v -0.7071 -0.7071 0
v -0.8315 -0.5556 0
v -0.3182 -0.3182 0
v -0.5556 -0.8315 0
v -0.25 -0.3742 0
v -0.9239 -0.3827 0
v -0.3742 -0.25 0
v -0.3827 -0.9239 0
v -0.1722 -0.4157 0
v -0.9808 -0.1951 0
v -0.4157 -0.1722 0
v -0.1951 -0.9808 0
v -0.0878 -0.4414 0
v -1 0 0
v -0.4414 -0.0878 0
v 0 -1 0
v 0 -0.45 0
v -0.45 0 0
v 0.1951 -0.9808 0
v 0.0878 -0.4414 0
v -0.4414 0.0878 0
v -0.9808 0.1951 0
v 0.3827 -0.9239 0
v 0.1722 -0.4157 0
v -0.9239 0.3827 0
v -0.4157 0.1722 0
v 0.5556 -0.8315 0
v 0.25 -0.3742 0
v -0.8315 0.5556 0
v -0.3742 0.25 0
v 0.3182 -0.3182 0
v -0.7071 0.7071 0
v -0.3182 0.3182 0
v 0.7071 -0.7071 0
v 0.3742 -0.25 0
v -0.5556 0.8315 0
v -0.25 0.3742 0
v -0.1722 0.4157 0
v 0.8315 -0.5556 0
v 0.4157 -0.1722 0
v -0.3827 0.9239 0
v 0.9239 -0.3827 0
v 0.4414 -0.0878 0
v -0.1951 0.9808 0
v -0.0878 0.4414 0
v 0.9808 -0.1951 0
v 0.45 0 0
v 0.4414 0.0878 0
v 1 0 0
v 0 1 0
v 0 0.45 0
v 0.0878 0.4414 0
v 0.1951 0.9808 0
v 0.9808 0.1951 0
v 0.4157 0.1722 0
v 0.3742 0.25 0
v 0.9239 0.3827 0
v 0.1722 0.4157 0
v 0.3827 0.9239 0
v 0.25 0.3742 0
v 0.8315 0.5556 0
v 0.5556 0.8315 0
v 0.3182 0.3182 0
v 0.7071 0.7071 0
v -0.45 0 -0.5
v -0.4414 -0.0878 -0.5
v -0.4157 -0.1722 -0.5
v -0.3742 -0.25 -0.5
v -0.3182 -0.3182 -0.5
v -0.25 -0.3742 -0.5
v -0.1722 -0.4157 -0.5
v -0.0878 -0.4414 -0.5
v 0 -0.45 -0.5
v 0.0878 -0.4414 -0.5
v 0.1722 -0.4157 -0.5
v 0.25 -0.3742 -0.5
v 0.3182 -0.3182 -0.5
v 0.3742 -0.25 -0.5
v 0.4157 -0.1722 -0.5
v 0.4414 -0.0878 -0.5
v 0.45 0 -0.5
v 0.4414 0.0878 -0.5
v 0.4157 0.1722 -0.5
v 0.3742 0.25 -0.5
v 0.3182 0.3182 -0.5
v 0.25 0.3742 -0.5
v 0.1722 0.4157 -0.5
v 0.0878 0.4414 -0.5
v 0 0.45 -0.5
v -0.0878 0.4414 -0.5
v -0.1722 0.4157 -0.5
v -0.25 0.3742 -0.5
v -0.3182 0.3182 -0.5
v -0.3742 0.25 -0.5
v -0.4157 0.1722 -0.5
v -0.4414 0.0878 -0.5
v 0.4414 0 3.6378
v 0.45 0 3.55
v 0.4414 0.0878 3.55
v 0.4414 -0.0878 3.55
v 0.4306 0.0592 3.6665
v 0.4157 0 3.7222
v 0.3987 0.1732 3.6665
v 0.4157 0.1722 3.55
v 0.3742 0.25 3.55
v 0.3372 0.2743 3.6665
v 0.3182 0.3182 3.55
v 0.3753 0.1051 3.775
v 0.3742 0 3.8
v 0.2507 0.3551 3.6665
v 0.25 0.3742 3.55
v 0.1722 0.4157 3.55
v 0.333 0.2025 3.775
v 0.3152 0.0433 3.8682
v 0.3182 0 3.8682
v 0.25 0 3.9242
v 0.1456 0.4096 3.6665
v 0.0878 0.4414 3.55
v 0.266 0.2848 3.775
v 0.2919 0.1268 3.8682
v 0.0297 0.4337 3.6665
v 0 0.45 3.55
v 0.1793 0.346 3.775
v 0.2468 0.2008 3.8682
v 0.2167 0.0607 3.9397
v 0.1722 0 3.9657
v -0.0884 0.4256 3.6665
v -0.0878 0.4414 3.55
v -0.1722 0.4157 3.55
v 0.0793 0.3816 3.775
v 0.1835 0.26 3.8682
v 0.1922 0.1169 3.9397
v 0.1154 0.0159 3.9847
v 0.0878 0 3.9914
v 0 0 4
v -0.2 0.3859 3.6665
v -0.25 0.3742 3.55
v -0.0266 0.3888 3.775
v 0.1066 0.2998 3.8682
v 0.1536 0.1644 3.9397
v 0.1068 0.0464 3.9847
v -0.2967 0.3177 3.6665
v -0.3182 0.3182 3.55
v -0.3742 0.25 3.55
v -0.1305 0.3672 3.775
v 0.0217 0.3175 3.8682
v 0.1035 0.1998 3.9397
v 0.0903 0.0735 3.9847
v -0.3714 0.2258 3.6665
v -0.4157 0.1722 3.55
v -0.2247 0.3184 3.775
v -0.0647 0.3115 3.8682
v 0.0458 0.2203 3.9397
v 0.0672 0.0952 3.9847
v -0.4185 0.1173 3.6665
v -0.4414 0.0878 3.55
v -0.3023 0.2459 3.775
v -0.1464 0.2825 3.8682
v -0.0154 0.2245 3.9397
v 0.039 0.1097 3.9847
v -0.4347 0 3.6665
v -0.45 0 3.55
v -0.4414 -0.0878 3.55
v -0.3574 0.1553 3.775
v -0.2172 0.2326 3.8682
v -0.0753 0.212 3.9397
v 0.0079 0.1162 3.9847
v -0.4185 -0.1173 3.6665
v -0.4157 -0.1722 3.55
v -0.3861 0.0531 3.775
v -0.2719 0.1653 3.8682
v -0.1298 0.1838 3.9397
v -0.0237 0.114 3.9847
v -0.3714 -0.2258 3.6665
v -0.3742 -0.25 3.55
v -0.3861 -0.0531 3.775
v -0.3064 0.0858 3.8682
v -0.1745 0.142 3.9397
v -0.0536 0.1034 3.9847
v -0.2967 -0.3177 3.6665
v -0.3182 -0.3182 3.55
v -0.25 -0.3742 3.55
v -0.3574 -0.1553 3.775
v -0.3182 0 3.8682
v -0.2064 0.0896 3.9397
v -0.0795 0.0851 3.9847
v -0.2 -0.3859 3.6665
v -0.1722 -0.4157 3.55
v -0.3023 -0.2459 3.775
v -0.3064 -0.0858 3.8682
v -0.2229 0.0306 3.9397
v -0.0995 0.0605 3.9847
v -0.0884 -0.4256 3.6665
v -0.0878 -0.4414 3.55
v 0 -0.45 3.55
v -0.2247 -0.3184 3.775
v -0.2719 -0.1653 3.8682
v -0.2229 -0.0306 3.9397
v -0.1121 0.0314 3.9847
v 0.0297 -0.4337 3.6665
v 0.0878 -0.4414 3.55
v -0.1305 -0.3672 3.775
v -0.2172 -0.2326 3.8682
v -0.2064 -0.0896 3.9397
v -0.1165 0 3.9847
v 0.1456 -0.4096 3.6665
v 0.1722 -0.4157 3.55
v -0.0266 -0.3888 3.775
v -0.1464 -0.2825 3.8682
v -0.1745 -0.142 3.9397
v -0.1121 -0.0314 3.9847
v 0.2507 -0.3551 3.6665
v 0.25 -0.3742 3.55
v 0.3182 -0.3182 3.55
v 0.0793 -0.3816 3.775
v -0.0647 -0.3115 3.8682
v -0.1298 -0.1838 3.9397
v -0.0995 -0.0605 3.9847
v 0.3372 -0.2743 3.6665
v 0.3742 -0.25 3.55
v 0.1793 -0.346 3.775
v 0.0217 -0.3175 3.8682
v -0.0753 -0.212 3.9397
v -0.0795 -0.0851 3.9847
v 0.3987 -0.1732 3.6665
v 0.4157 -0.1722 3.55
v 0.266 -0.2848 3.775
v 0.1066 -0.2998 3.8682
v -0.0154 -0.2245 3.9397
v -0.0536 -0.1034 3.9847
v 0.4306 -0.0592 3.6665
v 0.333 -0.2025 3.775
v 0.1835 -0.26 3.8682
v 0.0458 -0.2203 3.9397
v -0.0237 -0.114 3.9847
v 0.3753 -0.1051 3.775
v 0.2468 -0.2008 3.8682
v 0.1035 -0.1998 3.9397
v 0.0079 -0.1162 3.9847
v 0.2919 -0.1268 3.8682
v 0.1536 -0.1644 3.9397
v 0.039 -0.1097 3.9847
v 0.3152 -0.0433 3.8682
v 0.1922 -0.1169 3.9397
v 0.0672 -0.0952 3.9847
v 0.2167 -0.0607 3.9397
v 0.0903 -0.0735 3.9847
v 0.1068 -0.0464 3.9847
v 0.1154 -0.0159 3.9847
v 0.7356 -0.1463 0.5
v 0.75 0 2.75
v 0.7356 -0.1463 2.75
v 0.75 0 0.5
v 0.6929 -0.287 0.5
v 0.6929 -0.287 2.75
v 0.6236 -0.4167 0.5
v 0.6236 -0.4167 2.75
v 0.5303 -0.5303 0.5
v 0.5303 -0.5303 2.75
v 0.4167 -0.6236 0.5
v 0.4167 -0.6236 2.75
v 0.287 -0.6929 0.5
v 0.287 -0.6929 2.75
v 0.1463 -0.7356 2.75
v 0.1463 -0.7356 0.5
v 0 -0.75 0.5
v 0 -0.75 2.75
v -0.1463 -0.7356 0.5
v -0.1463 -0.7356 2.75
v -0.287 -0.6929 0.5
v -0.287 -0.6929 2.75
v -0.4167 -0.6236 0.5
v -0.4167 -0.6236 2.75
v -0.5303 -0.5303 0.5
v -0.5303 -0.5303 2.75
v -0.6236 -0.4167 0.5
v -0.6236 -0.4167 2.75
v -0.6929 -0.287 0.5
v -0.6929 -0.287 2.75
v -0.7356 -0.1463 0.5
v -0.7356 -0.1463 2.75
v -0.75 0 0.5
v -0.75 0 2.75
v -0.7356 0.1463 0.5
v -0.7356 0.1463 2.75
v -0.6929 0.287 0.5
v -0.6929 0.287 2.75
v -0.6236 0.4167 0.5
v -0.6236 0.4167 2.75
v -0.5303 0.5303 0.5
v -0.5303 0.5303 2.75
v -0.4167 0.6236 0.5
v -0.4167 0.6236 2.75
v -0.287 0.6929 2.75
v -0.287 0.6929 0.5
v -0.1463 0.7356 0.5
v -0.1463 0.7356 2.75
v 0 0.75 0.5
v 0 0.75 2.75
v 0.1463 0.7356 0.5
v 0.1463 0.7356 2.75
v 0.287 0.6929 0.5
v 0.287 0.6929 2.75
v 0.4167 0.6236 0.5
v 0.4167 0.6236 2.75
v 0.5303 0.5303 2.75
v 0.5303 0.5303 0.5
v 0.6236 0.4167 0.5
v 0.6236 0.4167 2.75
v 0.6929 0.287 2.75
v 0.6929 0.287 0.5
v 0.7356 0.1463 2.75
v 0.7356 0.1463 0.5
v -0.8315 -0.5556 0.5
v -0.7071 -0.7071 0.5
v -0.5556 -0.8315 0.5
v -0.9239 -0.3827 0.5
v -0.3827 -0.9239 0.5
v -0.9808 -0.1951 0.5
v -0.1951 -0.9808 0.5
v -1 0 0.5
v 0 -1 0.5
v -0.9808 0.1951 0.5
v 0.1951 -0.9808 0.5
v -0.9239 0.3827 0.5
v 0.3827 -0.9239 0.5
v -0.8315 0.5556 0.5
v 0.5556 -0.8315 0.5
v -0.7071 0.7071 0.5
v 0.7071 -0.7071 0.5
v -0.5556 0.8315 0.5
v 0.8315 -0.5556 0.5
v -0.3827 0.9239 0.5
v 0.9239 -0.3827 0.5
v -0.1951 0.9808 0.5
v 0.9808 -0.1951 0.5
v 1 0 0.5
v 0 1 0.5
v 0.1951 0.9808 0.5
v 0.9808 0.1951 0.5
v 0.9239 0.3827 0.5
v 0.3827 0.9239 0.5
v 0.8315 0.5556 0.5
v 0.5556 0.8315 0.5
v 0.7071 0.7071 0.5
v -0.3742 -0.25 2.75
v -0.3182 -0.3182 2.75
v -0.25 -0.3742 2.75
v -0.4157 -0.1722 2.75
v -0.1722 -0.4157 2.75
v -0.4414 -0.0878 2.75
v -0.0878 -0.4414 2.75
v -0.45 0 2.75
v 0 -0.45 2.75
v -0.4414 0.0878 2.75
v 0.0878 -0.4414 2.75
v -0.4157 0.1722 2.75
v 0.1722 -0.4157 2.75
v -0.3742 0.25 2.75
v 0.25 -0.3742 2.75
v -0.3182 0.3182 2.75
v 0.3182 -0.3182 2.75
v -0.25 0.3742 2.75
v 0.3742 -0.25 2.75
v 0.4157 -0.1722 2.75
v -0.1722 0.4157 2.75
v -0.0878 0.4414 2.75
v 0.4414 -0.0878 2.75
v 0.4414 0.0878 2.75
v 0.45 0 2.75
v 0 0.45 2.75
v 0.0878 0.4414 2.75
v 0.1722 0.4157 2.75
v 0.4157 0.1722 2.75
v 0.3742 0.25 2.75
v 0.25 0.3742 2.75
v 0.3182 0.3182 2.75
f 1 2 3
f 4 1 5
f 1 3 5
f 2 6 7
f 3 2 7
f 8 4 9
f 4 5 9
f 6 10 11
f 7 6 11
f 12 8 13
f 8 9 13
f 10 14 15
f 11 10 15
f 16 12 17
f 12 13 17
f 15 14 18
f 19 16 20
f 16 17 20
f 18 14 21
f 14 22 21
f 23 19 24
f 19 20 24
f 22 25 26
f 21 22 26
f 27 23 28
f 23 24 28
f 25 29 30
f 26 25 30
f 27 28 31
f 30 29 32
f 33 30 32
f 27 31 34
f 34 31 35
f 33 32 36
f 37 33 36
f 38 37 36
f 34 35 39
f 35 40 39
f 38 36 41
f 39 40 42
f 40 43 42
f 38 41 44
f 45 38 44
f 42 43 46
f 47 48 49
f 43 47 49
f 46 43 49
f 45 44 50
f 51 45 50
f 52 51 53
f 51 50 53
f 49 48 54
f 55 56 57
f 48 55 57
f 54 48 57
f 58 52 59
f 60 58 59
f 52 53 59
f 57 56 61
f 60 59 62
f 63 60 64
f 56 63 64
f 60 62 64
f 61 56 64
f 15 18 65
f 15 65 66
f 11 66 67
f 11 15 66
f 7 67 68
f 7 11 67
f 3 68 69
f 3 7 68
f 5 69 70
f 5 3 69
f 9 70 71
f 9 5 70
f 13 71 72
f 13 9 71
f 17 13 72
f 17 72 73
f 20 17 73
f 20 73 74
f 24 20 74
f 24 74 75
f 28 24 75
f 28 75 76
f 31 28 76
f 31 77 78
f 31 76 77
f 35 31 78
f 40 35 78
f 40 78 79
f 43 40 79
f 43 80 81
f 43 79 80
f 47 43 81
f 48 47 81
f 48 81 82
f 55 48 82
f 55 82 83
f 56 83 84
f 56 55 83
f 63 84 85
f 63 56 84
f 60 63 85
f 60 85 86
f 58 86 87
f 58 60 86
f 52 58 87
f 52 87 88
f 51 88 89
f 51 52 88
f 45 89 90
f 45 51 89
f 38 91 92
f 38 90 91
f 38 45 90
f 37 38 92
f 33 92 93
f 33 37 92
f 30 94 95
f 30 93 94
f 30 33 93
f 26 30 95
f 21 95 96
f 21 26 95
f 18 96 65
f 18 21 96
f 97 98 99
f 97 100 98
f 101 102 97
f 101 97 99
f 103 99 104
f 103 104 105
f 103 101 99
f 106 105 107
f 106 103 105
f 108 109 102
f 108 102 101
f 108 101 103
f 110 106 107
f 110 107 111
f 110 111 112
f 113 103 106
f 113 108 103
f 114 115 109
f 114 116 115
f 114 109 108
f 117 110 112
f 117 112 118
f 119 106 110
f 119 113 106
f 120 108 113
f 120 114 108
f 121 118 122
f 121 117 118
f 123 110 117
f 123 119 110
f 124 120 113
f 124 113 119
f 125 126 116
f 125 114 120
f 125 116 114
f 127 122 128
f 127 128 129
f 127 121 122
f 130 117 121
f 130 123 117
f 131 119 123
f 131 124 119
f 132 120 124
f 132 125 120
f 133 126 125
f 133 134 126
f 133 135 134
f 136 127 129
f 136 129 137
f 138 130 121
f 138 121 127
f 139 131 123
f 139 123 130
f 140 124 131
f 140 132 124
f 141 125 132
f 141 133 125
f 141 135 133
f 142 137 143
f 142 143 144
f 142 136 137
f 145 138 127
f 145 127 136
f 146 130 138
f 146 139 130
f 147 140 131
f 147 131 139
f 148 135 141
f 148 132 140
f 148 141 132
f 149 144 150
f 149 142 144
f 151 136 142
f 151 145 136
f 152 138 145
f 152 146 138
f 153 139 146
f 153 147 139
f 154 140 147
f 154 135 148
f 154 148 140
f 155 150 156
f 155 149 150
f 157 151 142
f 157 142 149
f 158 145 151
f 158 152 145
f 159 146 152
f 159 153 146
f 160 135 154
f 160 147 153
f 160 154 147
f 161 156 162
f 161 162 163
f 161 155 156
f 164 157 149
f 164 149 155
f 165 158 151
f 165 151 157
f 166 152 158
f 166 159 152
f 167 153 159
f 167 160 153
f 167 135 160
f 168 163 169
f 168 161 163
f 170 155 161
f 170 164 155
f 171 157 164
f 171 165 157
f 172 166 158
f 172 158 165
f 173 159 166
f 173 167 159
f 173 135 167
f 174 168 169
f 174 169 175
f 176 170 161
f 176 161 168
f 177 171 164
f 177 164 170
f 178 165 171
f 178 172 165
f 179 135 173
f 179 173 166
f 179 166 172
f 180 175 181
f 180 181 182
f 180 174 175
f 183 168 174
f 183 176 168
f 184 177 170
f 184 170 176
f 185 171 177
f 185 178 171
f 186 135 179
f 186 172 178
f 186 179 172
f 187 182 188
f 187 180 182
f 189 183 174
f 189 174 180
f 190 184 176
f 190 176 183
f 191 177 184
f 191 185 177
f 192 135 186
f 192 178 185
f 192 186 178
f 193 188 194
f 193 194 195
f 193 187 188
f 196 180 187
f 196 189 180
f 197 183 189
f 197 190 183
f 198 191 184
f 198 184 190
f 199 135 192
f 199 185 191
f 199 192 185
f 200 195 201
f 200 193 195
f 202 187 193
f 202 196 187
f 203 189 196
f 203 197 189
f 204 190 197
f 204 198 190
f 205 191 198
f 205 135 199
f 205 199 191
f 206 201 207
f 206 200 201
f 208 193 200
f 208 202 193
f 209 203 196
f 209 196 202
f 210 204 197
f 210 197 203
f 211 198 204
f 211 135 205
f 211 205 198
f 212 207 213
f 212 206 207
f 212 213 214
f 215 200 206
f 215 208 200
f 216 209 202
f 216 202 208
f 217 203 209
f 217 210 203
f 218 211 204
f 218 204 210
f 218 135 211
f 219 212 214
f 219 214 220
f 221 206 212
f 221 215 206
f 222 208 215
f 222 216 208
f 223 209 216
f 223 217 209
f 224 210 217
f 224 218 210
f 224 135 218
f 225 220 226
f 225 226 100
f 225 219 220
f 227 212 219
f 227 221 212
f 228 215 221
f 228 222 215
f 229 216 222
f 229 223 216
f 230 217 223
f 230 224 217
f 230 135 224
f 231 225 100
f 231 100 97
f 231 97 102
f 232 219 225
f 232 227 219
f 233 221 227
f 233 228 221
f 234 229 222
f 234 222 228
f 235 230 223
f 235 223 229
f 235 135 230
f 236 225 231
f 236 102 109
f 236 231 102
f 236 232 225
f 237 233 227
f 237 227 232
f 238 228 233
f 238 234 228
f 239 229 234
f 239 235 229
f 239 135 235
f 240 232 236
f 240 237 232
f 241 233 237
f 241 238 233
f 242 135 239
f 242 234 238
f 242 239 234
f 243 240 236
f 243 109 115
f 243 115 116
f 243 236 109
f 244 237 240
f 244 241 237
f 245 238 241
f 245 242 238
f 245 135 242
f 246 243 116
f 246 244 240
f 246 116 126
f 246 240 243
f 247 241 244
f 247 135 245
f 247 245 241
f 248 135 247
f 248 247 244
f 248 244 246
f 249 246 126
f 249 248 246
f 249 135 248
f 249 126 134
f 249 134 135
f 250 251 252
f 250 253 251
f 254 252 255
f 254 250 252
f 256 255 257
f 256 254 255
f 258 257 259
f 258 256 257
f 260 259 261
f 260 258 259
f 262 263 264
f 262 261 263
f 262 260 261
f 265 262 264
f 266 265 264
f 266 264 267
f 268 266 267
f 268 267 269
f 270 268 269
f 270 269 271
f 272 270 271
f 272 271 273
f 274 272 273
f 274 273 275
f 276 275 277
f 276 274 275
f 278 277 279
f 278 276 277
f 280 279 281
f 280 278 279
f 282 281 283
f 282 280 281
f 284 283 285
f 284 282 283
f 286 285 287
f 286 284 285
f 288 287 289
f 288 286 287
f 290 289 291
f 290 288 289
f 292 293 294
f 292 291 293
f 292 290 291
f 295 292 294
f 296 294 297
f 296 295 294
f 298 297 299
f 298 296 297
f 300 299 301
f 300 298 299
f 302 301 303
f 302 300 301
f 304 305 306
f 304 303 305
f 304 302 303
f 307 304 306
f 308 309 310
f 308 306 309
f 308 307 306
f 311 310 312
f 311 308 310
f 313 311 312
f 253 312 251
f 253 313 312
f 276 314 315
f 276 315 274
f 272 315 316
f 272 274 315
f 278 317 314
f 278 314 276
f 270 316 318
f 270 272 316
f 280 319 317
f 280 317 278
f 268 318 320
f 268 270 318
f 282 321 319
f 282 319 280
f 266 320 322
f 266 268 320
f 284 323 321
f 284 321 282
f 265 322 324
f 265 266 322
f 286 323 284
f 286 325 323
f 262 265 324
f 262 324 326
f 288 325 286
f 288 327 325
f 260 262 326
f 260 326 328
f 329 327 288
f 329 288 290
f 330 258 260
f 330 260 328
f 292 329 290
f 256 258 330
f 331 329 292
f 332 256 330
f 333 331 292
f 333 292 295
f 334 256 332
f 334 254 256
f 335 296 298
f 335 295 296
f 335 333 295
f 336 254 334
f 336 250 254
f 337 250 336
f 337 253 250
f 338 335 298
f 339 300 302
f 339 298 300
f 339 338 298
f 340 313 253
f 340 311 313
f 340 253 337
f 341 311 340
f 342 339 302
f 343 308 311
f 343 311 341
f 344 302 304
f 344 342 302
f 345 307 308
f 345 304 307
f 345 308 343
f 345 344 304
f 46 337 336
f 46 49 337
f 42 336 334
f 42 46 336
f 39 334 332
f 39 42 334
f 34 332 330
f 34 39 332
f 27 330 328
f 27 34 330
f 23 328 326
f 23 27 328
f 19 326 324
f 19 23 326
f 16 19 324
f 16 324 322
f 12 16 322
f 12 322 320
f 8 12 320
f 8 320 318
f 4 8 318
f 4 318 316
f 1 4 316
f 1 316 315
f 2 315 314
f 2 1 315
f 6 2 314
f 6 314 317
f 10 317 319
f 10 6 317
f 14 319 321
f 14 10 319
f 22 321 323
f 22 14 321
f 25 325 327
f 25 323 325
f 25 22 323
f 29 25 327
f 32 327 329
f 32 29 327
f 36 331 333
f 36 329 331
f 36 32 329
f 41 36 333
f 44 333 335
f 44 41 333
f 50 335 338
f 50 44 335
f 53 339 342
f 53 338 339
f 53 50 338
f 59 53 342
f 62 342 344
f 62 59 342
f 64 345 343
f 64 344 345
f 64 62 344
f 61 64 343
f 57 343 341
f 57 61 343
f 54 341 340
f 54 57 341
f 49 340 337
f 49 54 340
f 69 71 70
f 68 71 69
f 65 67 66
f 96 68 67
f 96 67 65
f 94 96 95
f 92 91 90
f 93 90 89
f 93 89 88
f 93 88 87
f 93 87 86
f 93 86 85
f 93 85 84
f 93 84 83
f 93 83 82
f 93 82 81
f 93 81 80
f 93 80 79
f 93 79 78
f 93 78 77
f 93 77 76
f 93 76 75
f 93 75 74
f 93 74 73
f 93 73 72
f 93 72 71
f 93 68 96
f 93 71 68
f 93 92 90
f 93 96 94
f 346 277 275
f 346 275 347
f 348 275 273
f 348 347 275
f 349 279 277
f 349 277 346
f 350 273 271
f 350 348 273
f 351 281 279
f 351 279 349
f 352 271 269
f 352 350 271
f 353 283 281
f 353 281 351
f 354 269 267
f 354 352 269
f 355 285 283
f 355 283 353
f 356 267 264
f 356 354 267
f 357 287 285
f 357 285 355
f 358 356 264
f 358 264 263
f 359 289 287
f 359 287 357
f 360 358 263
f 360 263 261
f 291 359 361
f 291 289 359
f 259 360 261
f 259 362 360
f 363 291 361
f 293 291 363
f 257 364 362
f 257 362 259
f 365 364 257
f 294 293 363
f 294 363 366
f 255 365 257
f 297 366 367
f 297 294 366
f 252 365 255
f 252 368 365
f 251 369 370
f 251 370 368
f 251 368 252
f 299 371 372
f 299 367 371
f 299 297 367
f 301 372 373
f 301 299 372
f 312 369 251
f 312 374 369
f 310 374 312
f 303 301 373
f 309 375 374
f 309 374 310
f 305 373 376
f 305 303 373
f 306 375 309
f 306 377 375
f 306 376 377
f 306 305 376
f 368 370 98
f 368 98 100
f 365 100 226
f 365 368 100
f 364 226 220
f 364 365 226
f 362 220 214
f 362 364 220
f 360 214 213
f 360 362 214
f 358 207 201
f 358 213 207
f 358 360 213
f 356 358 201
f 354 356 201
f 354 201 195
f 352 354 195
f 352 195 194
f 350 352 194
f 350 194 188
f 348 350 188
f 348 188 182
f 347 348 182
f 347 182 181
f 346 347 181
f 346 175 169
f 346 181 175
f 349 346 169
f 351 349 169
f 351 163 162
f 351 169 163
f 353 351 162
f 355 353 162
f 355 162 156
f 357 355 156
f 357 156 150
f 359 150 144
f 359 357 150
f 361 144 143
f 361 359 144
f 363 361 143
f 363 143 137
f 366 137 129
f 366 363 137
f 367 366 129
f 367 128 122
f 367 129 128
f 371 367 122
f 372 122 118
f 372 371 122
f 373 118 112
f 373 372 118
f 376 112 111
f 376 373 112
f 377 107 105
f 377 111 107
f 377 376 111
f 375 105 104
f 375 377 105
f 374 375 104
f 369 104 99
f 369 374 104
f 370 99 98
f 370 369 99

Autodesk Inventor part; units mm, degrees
ref_plane "YZ Plane" through (0, 0, 0) normal (1, 0, 0) x (0, 1, 0)
ref_plane "XZ Plane" through (0, 0, 0) normal (0, 1, 0) x (-1, 0, 0)
ref_plane "XY Plane" through (0, 0, 0) normal (0, 0, 1) x (1, 0, 0)
sketch "Skizze1" plane through (0, 0, 0) normal (0, 0, 1) x (1, 0, 0)
  circle A0 centre (0, 0) radius 1
  dimension "d0" = 2
extrude "Extrusion1" add sketch "Skizze1" along normal blind 0.5
sketch "Skizze2" plane through (0, 0, 0.5) normal (0, 0, 1) x (1, 0, 0)
  circle A0 centre (0, 0) radius 0.75
  dimension "d3" = 1.5
extrude "Extrusion2" add sketch "Skizze2" along normal blind 2.25
sketch "Skizze3" plane through (0, 0, 2.75) normal (0, 0, 1) x (1, 0, 0)
  circle A0 centre (0, 0) radius 0.45
  dimension "d6" = 0.9
extrude "Extrusion3" add sketch "Skizze3" along normal blind 1.25
fillet "Rundung1" radius 0.45 1 edges at (-0.45, 0, 4)
sketch "Skizze4" plane through (0, 0, 0) normal (0, 0, -1) x (-1, 0, 0)
  circle A0 centre (0, 0) radius 0.45
  dimension "d10" = 0.9
extrude "Extrusion4" add sketch "Skizze4" along normal blind 0.5
properties part number "PoGo_pin_sml" material "Gold"
